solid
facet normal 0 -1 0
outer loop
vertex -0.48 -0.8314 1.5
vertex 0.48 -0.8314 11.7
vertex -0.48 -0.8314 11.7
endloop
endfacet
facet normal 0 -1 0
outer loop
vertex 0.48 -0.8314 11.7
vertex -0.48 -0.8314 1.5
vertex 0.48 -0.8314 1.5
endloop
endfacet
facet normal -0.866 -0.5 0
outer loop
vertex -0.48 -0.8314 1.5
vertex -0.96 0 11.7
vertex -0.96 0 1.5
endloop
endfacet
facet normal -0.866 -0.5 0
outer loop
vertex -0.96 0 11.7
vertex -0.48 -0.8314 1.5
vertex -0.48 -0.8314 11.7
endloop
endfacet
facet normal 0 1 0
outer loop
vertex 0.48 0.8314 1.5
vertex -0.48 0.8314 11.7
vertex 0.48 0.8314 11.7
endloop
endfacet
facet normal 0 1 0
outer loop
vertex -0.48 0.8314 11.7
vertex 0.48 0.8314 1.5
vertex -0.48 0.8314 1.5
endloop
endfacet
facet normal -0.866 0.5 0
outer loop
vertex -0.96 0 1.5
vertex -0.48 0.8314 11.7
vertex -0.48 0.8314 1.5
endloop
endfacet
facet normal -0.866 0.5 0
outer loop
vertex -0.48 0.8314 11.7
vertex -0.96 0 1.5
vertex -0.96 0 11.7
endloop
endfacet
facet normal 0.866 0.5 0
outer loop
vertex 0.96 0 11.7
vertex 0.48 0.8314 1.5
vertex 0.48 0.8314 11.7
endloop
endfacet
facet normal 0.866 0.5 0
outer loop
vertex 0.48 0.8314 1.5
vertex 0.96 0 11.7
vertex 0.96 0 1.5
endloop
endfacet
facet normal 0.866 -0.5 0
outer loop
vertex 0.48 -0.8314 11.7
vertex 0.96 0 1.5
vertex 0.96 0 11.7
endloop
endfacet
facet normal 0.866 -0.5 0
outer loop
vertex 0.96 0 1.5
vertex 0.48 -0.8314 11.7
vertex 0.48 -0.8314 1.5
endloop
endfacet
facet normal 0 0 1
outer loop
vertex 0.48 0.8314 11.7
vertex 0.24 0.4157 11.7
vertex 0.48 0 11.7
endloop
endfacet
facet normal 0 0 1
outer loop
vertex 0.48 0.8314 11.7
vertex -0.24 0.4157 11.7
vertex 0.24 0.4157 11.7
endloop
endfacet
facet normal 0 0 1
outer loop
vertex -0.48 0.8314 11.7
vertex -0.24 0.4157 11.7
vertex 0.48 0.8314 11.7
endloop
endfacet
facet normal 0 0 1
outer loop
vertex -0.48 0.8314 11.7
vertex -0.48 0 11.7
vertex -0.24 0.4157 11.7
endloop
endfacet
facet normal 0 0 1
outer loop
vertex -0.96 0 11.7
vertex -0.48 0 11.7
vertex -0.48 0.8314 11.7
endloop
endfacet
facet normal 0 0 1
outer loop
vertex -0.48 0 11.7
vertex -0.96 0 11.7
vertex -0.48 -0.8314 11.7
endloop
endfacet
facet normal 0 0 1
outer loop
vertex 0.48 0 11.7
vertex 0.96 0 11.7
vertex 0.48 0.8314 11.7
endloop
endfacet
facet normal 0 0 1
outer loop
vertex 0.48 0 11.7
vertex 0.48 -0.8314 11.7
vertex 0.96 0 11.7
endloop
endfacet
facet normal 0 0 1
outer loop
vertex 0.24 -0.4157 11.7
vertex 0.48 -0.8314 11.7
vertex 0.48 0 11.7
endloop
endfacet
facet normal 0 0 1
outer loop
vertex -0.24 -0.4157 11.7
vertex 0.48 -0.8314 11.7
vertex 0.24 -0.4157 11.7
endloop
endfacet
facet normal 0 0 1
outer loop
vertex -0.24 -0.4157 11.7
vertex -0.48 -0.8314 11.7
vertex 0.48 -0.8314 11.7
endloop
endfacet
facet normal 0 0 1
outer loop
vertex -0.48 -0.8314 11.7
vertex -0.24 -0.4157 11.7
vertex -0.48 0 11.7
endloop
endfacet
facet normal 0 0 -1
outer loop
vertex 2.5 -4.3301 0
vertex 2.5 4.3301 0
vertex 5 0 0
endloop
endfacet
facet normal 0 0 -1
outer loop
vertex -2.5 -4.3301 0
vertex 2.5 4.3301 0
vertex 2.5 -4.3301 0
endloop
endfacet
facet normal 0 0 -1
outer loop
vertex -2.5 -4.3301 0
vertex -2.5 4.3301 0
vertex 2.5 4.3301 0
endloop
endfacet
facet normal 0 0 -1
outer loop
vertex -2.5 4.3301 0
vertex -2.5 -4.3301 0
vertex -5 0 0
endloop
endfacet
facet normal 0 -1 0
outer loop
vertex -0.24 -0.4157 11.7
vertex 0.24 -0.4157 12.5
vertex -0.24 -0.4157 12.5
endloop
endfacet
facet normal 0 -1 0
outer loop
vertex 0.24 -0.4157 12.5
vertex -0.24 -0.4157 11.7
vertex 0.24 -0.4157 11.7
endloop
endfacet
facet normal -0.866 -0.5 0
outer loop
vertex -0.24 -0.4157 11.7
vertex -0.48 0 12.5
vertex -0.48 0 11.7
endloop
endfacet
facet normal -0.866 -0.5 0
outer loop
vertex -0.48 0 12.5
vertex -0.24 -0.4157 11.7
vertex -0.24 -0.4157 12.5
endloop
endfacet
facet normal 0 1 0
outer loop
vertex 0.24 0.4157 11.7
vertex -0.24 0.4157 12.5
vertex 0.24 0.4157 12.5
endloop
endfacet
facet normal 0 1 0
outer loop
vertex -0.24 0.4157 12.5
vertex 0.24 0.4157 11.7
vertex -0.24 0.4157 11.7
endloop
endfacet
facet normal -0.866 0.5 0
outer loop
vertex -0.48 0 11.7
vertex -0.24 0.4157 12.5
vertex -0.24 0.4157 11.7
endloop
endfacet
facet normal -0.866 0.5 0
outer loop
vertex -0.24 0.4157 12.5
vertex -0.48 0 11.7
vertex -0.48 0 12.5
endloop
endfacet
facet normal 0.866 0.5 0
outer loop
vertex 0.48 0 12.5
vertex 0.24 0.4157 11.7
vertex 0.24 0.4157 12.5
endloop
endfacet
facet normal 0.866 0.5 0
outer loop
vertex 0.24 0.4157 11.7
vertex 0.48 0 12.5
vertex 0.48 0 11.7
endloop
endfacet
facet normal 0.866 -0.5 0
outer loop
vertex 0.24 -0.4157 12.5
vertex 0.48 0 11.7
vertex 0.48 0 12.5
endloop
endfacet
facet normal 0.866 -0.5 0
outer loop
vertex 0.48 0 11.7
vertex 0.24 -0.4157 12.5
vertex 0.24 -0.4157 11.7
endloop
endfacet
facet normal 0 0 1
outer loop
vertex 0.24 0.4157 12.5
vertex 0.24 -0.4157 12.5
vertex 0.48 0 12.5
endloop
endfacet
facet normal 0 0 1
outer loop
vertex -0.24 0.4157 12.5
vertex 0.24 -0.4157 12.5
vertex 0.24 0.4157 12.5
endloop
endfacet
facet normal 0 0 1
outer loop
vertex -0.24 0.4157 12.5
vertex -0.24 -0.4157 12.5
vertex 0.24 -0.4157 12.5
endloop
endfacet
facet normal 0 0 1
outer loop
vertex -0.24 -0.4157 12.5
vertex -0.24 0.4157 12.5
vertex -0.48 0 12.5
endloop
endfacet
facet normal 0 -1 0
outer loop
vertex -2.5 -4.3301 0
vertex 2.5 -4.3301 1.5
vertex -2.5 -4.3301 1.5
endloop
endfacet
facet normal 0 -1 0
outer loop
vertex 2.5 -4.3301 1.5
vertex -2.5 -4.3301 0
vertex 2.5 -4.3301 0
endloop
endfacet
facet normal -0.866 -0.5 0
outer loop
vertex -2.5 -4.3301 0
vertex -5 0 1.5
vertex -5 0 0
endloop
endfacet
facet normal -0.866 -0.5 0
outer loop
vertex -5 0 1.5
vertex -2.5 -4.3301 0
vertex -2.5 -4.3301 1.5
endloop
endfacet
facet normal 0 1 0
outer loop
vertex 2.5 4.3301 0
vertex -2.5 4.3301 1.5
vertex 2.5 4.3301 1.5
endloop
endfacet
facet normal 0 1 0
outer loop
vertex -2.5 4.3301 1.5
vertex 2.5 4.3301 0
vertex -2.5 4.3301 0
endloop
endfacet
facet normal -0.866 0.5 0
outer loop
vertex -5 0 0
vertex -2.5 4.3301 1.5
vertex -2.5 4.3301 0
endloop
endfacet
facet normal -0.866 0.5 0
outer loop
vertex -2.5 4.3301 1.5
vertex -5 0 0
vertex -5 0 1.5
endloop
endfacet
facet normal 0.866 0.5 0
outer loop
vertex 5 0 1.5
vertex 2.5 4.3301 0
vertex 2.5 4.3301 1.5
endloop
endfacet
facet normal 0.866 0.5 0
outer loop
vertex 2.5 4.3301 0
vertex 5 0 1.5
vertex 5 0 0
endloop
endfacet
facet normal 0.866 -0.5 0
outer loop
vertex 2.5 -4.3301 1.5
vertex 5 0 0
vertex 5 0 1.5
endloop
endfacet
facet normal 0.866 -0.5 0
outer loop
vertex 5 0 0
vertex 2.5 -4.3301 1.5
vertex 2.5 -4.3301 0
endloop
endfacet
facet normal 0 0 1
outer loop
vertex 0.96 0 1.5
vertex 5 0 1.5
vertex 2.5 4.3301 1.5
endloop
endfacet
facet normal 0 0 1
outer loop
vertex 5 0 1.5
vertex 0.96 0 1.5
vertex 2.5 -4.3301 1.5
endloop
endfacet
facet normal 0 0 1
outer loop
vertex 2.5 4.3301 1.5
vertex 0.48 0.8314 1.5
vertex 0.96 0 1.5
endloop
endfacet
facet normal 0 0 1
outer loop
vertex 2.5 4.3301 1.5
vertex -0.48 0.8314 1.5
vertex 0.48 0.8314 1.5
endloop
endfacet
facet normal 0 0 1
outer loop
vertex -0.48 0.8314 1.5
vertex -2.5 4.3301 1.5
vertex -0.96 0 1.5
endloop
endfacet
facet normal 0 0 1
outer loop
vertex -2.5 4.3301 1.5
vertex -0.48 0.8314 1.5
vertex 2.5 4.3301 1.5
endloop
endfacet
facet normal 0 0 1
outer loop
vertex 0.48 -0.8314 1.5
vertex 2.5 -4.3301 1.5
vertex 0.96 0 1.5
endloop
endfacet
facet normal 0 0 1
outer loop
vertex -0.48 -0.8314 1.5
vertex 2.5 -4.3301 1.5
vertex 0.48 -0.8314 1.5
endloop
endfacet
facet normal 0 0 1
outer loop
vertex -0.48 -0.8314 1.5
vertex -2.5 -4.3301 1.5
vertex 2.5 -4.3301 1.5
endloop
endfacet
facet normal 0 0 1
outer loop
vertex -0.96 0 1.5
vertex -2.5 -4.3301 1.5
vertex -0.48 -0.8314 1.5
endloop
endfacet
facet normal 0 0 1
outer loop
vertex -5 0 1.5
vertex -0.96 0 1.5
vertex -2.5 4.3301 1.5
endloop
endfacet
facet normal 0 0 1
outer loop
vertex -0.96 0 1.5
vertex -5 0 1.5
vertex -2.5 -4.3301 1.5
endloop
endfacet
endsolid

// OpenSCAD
// file: ../cookie_cutter.scad
// Cookie cutter generator
// Pau Fernández <pauek@minidosis.org>
// GNU GPL v2

module dxf(file, layer, height) {
   orig = dxf_cross(file = file, layer = layer);
   echo("origin: ", orig);
   translate([-orig[0], -orig[1], 0])
      linear_extrude(height = height)
         import(file = file, layer = layer);
}

module needle(height, thin1, thin2) {
   union() {
      cylinder(r = thin1, h = height-0.8, $fn = 6);
      cylinder(r = thin2, h = height, $fn = 6);
   }
}

module wall(file, layer, height, thin) {
   difference() {
      minkowski() {
        dxf(file, layer, 0.01);
        cylinder(r = thin, h = height, $fn = 6);
      }
      translate([0, 0, -1]) dxf(file, layer, height + 2);
   }
}

module cutter(file, layer, height, nozzle_diameter) {
   thin1 = nozzle_diameter * 2.4;
   thin2 = nozzle_diameter * 1.2;
   difference() {
      minkowski() {
        dxf(file, layer, 0.01);
        needle(height, thin1, thin2);
      }
      translate([0, 0, -1]) dxf(file, layer, height + 2);
   }
}

module cookie_cutter(file, height, join_height, nozzle_diameter) {
   union () {
      cutter(file, "cutter", height, nozzle_diameter);
      wall(file, "outer", 1, 5);
   }
}

module cookie_cutter_join(file, height, nozzle_diameter) {
   mirror([1, 0, 0]) union () {
      cutter(file, "cutter", height, nozzle_diameter);
      wall(file, "outer", 1.5, 5);
      dxf(file, "join", 1.5);
   }
}
// main file
include <../cookie_cutter.scad>;
cookie_cutter_join("B.dxf", 12.5, 0.4);
